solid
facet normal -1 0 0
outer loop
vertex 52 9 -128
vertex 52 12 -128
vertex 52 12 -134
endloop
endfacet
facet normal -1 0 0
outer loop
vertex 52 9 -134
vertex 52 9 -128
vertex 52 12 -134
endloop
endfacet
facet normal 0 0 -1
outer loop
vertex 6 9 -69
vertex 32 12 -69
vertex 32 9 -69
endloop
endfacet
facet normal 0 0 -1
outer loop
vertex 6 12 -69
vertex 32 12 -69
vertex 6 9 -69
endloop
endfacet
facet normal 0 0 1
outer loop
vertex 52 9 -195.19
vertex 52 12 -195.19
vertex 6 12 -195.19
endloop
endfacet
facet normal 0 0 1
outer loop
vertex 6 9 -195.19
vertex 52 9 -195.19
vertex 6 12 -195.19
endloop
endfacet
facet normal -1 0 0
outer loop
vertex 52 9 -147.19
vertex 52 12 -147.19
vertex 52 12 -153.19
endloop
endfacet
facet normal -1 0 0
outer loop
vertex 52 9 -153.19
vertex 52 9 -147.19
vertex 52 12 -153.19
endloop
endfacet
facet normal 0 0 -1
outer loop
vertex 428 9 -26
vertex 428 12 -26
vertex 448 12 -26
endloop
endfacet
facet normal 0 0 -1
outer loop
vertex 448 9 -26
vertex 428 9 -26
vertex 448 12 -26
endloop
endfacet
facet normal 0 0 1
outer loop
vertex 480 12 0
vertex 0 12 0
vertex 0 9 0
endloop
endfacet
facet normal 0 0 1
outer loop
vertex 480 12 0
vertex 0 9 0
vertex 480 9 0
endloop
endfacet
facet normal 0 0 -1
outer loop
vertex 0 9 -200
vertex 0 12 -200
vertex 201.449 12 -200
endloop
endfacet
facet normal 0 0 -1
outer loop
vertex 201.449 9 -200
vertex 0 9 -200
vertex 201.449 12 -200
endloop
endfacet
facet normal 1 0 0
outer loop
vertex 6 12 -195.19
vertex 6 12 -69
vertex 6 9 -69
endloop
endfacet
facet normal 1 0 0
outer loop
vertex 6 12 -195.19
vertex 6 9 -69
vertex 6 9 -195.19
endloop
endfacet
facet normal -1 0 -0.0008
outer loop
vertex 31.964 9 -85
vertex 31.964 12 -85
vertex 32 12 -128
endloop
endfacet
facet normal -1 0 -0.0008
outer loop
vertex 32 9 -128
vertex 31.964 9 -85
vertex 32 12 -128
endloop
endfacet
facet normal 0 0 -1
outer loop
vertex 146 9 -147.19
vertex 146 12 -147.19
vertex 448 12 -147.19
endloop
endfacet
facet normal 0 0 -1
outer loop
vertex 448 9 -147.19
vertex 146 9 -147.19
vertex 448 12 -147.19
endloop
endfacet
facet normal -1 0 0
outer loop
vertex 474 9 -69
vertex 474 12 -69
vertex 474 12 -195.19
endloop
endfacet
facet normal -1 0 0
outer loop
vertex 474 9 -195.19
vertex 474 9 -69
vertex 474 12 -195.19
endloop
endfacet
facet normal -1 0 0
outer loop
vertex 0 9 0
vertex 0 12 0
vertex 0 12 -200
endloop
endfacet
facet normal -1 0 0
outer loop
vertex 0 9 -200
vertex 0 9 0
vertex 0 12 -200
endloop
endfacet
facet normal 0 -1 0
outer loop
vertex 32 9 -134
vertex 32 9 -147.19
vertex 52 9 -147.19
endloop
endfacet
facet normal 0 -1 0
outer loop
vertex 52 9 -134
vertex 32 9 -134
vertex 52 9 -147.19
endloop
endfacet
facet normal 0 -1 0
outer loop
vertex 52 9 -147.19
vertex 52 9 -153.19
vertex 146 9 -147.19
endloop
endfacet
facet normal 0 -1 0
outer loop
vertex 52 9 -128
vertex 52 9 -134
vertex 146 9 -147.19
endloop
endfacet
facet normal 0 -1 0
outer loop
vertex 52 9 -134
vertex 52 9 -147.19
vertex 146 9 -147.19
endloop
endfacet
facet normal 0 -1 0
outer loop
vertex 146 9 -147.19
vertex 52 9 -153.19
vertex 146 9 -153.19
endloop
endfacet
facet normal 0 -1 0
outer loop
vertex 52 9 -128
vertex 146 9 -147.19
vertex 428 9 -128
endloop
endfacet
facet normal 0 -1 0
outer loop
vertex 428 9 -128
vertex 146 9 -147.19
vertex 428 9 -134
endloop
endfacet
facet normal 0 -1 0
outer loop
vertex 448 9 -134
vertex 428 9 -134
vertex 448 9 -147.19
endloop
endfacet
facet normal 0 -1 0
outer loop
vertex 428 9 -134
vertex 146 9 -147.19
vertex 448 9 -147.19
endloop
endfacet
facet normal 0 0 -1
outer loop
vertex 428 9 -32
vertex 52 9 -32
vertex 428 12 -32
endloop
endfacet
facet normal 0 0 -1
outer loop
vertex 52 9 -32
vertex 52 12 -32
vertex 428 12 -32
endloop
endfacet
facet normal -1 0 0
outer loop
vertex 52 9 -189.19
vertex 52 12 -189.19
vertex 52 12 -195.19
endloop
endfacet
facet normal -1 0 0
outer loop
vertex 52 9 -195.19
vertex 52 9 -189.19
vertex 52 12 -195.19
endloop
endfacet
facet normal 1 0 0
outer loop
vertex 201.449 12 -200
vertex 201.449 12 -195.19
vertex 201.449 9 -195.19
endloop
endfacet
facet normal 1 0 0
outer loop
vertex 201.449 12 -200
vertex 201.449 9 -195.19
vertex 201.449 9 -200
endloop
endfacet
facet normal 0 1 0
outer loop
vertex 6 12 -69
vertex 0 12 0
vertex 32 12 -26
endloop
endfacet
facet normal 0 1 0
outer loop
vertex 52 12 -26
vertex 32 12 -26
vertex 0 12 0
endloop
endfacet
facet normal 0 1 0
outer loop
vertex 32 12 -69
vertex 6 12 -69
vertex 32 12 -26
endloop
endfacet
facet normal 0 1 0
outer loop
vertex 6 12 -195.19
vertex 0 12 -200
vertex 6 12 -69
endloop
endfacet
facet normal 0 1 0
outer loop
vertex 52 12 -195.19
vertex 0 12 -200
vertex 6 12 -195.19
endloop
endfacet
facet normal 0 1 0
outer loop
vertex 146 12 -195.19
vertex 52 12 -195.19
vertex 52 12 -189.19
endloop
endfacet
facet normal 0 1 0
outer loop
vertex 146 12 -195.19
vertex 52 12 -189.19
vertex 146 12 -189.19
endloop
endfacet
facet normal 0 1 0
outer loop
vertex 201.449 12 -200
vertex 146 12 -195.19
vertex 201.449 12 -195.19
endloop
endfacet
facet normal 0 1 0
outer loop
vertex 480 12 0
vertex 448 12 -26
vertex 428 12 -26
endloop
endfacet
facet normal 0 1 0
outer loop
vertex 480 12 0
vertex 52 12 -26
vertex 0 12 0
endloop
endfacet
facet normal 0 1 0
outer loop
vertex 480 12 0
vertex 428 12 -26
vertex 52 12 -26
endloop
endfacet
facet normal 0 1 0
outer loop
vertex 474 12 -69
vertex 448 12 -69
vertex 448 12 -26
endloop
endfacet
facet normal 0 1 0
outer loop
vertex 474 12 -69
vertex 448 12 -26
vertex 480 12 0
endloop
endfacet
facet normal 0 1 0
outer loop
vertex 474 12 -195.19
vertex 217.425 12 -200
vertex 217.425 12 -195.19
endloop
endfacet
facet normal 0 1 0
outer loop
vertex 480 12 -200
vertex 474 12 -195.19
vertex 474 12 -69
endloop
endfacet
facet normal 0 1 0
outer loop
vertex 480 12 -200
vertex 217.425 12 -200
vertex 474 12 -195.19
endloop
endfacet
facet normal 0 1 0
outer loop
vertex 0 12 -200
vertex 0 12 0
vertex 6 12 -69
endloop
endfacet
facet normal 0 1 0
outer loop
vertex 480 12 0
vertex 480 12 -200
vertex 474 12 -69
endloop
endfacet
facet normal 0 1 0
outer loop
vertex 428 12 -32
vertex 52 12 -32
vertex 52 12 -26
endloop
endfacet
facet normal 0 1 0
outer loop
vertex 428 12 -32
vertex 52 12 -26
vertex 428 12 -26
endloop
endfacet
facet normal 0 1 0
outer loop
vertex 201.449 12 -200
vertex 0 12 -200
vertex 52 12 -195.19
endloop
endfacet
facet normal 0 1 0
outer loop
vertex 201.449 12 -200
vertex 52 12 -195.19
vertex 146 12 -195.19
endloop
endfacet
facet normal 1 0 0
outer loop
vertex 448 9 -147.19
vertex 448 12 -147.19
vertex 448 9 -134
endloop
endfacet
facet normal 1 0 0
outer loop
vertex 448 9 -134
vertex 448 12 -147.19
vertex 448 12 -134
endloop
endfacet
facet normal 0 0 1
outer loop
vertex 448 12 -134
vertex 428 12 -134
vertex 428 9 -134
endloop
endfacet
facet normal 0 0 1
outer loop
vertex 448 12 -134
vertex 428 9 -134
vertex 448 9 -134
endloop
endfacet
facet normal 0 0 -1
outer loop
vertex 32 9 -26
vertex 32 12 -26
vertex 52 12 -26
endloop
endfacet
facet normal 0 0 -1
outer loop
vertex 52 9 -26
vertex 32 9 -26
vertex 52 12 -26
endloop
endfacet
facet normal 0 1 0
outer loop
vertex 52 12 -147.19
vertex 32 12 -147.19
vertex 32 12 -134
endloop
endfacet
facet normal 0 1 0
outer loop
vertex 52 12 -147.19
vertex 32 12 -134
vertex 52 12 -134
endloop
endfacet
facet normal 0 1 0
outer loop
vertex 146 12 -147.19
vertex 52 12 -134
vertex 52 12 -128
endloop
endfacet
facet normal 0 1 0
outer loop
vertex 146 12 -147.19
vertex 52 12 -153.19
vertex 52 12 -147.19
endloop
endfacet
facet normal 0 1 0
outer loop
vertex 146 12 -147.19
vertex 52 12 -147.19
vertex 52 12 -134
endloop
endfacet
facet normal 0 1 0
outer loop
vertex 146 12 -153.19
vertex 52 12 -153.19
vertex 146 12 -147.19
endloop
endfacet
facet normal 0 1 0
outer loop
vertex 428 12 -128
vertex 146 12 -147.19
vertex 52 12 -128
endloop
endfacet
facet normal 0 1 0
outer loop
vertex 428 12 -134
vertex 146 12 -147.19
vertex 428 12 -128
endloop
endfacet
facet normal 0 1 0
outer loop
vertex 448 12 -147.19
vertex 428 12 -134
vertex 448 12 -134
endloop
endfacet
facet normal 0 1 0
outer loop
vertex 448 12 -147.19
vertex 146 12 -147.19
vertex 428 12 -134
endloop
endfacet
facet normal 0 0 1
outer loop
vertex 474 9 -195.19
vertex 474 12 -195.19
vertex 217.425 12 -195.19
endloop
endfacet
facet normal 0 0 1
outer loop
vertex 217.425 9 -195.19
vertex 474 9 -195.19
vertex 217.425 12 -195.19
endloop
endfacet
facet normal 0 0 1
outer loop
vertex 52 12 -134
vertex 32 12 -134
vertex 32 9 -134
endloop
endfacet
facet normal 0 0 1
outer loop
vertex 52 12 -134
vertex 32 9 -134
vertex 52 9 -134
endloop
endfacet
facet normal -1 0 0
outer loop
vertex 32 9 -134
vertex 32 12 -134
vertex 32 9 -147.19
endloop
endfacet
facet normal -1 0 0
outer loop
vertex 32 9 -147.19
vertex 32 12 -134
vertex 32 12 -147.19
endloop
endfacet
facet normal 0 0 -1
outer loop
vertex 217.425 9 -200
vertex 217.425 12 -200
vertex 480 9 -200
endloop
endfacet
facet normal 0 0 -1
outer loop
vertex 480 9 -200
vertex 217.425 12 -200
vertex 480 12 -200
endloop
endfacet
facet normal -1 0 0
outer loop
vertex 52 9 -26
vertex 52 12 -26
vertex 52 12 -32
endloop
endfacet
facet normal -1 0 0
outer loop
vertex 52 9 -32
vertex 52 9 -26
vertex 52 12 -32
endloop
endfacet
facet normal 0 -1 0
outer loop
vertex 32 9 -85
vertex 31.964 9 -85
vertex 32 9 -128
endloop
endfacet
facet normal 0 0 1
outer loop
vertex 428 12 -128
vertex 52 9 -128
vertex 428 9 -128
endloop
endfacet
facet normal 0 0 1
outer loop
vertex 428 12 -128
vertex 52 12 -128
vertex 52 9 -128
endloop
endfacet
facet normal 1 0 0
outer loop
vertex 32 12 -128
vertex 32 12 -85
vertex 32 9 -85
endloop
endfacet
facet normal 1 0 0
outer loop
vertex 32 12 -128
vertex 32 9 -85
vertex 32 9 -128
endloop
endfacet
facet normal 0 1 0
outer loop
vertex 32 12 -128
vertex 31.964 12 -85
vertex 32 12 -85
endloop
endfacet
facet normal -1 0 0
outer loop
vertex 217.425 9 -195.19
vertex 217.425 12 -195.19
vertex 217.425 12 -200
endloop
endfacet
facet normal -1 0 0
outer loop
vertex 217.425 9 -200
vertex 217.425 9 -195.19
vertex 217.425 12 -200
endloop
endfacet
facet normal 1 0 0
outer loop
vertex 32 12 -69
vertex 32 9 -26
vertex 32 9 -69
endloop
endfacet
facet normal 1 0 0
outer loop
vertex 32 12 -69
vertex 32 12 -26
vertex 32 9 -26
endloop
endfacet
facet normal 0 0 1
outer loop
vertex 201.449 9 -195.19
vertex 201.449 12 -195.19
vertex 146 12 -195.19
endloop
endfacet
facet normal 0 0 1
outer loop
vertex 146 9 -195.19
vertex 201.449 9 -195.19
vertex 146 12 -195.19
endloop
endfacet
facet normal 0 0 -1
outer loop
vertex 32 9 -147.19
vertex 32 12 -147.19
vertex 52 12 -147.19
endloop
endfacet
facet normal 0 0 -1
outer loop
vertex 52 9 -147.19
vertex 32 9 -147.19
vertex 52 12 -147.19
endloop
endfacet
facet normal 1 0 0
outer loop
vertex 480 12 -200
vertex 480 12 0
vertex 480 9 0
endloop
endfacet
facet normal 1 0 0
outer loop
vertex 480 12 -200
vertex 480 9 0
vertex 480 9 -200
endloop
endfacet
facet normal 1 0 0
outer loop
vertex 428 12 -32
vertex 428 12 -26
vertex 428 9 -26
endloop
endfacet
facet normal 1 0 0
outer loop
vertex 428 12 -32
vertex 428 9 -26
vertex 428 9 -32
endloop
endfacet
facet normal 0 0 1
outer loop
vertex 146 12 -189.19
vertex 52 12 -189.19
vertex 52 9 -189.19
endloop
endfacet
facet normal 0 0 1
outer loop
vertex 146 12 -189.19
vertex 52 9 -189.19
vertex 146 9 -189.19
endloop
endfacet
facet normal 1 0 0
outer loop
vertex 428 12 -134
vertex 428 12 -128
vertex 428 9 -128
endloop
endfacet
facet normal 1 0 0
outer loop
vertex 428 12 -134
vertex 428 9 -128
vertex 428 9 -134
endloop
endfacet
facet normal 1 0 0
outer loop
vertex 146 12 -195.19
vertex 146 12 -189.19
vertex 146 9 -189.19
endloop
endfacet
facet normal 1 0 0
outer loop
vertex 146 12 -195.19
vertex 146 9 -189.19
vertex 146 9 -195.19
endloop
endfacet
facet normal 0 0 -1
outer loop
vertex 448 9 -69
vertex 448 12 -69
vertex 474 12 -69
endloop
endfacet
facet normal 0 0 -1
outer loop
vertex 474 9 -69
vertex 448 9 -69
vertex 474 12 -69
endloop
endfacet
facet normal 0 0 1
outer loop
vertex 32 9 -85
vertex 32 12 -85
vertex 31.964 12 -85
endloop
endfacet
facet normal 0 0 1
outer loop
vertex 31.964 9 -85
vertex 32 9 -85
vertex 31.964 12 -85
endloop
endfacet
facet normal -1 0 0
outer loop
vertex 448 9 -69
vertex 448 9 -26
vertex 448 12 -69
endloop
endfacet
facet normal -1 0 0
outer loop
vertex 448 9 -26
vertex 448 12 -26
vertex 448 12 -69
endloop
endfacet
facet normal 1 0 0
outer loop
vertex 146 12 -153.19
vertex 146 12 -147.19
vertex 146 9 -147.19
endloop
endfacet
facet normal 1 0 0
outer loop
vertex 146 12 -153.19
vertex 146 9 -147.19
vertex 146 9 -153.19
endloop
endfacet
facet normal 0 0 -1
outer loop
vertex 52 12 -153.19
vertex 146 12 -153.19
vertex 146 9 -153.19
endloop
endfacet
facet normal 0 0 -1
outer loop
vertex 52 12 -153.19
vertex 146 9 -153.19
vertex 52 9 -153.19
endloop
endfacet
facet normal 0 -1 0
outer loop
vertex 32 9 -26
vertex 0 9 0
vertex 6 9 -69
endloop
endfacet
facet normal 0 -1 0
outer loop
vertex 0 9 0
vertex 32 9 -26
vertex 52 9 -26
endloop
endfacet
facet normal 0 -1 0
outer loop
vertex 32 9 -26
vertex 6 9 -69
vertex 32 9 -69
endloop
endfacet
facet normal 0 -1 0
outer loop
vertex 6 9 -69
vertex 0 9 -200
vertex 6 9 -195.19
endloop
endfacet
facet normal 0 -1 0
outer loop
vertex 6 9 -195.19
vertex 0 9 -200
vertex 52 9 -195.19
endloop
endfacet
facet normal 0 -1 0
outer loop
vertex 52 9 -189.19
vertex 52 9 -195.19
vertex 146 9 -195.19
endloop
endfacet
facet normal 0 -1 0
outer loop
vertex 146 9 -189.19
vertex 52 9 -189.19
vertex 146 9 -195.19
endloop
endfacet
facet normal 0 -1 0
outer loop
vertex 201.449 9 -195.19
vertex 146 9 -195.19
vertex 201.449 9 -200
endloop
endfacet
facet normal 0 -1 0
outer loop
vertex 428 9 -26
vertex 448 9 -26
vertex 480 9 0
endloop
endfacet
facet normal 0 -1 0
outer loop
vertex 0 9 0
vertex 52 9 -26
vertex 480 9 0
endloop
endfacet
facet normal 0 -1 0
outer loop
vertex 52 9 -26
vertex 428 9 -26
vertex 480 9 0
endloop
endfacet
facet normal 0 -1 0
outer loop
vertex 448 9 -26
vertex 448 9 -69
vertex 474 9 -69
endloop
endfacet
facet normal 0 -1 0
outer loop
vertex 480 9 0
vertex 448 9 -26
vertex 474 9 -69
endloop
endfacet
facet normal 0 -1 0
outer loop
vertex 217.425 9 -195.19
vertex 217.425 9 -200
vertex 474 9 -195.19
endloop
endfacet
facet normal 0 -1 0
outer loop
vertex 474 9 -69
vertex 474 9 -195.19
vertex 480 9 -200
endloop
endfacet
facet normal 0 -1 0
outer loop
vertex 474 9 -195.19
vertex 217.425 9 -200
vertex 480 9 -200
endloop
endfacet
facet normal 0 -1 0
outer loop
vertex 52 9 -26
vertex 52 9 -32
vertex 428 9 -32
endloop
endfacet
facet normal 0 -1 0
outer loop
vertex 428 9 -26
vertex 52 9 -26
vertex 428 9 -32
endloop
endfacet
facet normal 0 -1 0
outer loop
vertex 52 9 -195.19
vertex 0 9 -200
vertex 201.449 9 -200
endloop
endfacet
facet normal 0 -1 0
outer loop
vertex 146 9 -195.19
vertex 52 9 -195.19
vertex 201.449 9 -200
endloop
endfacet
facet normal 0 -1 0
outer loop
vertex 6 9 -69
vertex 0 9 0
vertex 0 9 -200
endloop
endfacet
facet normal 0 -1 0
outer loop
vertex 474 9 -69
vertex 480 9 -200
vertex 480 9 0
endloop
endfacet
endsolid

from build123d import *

# Parameters (mm, degrees)
CROQUIS1_W              = 486.2
CROQUIS1_H              = 206.2
CROQUIS1_W_2            = 480
CROQUIS1_H_2            = 200
SALIENTE_EXTRUIR1_DEPTH = 12
CROQUIS3_W              = 486.2
CROQUIS3_H              = 206.2
CROQUIS3_W_2            = 480
CROQUIS3_H_2            = 200
CORTAR_EXTRUIR1_DEPTH   = 5
CORTAR_EXTRUIR3_DEPTH   = 8
CROQUIS4_W              = 20
CROQUIS4_H              = 6
CORTAR_EXTRUIR4_DEPTH   = 3
CORTAR_EXTRUIR5_DEPTH   = 2
CROQUIS7_W              = 721.947089947
CROQUIS7_H              = 359.419856831
CORTAR_EXTRUIR6_DEPTH   = 10
CROQUIS8_W              = 416
CROQUIS8_H              = 96
CORTAR_EXTRUIR7_DEPTH   = 10
CROQUIS9_W              = 531.904745737
CROQUIS9_H              = 246.353411826
CORTAR_EXTRUIR8_DEPTH   = 10


with BuildPart() as part:
    # Croquis1 → Saliente-Extruir1 (new body)
    with BuildSketch(Plane(origin=(0, 0, 0), x_dir=(1, 0, 0), z_dir=(0, 1, 0))):
        with Locations((240, 100)):
            Rectangle(CROQUIS1_W, CROQUIS1_H)
        with Locations((240, 100)):
            Rectangle(CROQUIS1_W_2, CROQUIS1_H_2, mode=Mode.SUBTRACT)
        with Locations((240, 100)):
            Rectangle(CROQUIS1_W_2, CROQUIS1_H_2)
    extrude(amount=SALIENTE_EXTRUIR1_DEPTH)

    # Croquis3 → Cortar-Extruir1 (cut)
    with BuildSketch(Plane(origin=(0, 12, 0), x_dir=(1, 0, 0), z_dir=(0, 1, 0))):
        with Locations((240, 100)):
            Rectangle(CROQUIS3_W, CROQUIS3_H)
        with Locations((240, 100)):
            Rectangle(CROQUIS3_W_2, CROQUIS3_H_2, mode=Mode.SUBTRACT)
    extrude(amount=-CORTAR_EXTRUIR1_DEPTH, mode=Mode.SUBTRACT)

    # Croquis2 → Cortar-Extruir3 (cut)
    with BuildSketch(Plane(origin=(0, 12, 0), x_dir=(1, 0, 0), z_dir=(0, 1, 0))):
        with BuildLine():
            ThreePointArc((16, 189.1902066), (13.171572875, 188.018633725), (12, 185.1902066))
            Line((12, 185.1902066), (12, 78))
            ThreePointArc((12, 78), (12.878679656, 75.878679656), (15, 75))
            Line((15, 75), (32, 75))
            Line((32, 75), (32, 32))
            Line((32, 32), (448, 32))
            Line((448, 32), (448, 75))
            Line((448, 75), (464, 75))
            ThreePointArc((464, 75), (466.828427125, 76.171572875), (468, 79))
            Line((468, 79), (468, 185.1902066))
            ThreePointArc((468, 185.1902066), (466.828427125, 188.018633725), (464, 189.1902066))
            Line((464, 189.1902066), (217.424703227, 189.1902066))
            Line((217.424703227, 189.1902066), (217.424703227, 203.1))
            Line((217.424703227, 203.1), (201.44869327, 203.1))
            Line((201.44869327, 203.1), (201.44869327, 189.1902066))
            Line((201.44869327, 189.1902066), (16, 189.1902066))
        make_face()
        with BuildLine():
            Line((32, 85), (31.963588191, 85))
            ThreePointArc((31.963588191, 85), (24.892520379, 87.928932188), (21.963588191, 95))
            Line((21.963588191, 95), (21.963588191, 175.1902066))
            ThreePointArc((21.963588191, 175.1902066), (23.135161066, 178.018633725), (25.963588191, 179.1902066))
            Line((25.963588191, 179.1902066), (28, 179.1902066))
            ThreePointArc((28, 179.1902066), (30.828427125, 178.018633725), (32, 175.1902066))
            Line((32, 175.1902066), (32, 153.1902066))
            Line((32, 153.1902066), (166, 153.1902066))
            Line((166, 153.1902066), (166, 175.1902066))
            ThreePointArc((166, 175.1902066), (167.171572875, 178.018633725), (170, 179.1902066))
            Line((170, 179.1902066), (448.036411809, 179.1902066))
            ThreePointArc((448.036411809, 179.1902066), (455.107479621, 176.261274412), (458.036411809, 169.1902066))
            Line((458.036411809, 169.1902066), (458.036411809, 135.000000034))
            Line((458.036411809, 135.000000034), (458.803569043, 95.19268186))
            ThreePointArc((458.803569043, 95.19268186), (455.944291637, 87.997386866), (448.80542553, 85))
            Line((448.80542553, 85), (448, 85))
            Line((448, 85), (448, 128))
            Line((448, 128), (32, 128))
            Line((32, 128), (32, 85))
        make_face(mode=Mode.SUBTRACT)
    extrude(amount=-CORTAR_EXTRUIR3_DEPTH, mode=Mode.SUBTRACT)

    # Croquis4 → Cortar-Extruir4 (cut)
    with BuildSketch(Plane(origin=(0, 12, 0), x_dir=(1, 0, 0), z_dir=(0, 1, 0))):
        with BuildLine():
            Line((31.963588191, 85), (32, 128))
            Line((32, 128), (32, 134))
            Line((32, 134), (32, 147.1902066))
            Line((32, 147.1902066), (32, 153.1902066))
            Line((32, 153.1902066), (32, 175.1902066))
            ThreePointArc((32, 175.1902066), (30.828427125, 178.018633725), (28, 179.1902066))
            Line((28, 179.1902066), (25.963588191, 179.1902066))
            ThreePointArc((25.963588191, 179.1902066), (23.135161066, 178.018633725), (21.963588191, 175.1902066))
            Line((21.963588191, 175.1902066), (21.963588191, 95))
            ThreePointArc((21.963588191, 95), (24.892520379, 87.928932188), (31.963588191, 85))
        make_face()
        with Locations((42, 131)):
            Rectangle(CROQUIS4_W, CROQUIS4_H)
        with Locations((42, 150.1902066)):
            Rectangle(CROQUIS4_W, CROQUIS4_H)
        with BuildLine():
            ThreePointArc((12, 78), (12.878679656, 75.878679656), (15, 75))
            Line((15, 75), (32, 75))
            Line((32, 75), (32, 69))
            Line((32, 69), (6, 69))
            Line((6, 69), (6, 80))
            Line((6, 80), (6, 195.1902066))
            Line((6, 195.1902066), (16, 195.1902066))
            Line((16, 195.1902066), (32, 195.1902066))
            Line((32, 195.1902066), (32, 189.1902066))
            Line((32, 189.1902066), (16, 189.1902066))
            ThreePointArc((16, 189.1902066), (13.171572875, 188.018633725), (12, 185.1902066))
            Line((12, 185.1902066), (12, 80))
            Line((12, 80), (12, 78))
        make_face()
        with Locations((42, 192.1902066)):
            Rectangle(CROQUIS4_W, CROQUIS4_H)
        with Locations((42, 29)):
            Rectangle(CROQUIS4_W, CROQUIS4_H)
        with Locations((156, 192.1902066)):
            Rectangle(CROQUIS4_W, CROQUIS4_H)
        with Locations((156, 150.1902066)):
            Rectangle(CROQUIS4_W, CROQUIS4_H)
        with BuildLine():
            Line((166, 147.1902066), (448, 147.1902066))
            Line((448, 147.1902066), (458.036411809, 147.1902066))
            Line((458.036411809, 147.1902066), (458.036411809, 169.1902066))
            ThreePointArc((458.036411809, 169.1902066), (455.107479621, 176.261274412), (448.036411809, 179.1902066))
            Line((448.036411809, 179.1902066), (170, 179.1902066))
            ThreePointArc((170, 179.1902066), (167.171572875, 178.018633725), (166, 175.1902066))
            Line((166, 175.1902066), (166, 153.1902066))
            Line((166, 153.1902066), (166, 147.1902066))
        make_face()
        with BuildLine():
            Line((458.036411809, 169.1902066), (458.036411809, 147.1902066))
            Line((458.036411809, 147.1902066), (474, 147.1902066))
            Line((474, 147.1902066), (474, 195.1902066))
            Line((474, 195.1902066), (166, 195.1902066))
            Line((166, 195.1902066), (166, 189.1902066))
            Line((166, 189.1902066), (166, 175.1902066))
            ThreePointArc((166, 175.1902066), (167.171572875, 178.018633725), (170, 179.1902066))
            Line((170, 179.1902066), (448.036411809, 179.1902066))
            ThreePointArc((448.036411809, 179.1902066), (455.107479621, 176.261274412), (458.036411809, 169.1902066))
        make_face()
        with BuildLine():
            Line((448.80542553, 85), (448, 85))
            Line((448, 85), (448, 69))
            Line((448, 69), (474, 69))
            Line((474, 69), (474, 147.1902066))
            Line((474, 147.1902066), (458.036411809, 147.1902066))
            Line((458.036411809, 147.1902066), (458.036411809, 135.000000034))
            Line((458.036411809, 135.000000034), (458.803569043, 95.19268186))
            ThreePointArc((458.803569043, 95.19268186), (455.944291637, 87.997386866), (448.80542553, 85))
        make_face()
        with Locations((438, 131)):
            Rectangle(CROQUIS4_W, CROQUIS4_H)
        with Locations((438, 29)):
            Rectangle(CROQUIS4_W, CROQUIS4_H)
        with BuildLine():
            Line((448, 134), (448, 128))
            Line((448, 128), (448, 85))
            Line((448, 85), (448.80542553, 85))
            ThreePointArc((448.80542553, 85), (455.944291637, 87.997386866), (458.803569043, 95.19268186))
            Line((458.803569043, 95.19268186), (458.036411809, 135.000000034))
            Line((458.036411809, 135.000000034), (458.036411809, 147.1902066))
            Line((458.036411809, 147.1902066), (448, 147.1902066))
            Line((448, 147.1902066), (448, 134))
        make_face()
    extrude(amount=-CORTAR_EXTRUIR4_DEPTH, mode=Mode.SUBTRACT)

    # Croquis5 → Cortar-Extruir5 (cut)
    with BuildSketch(Plane(origin=(0, 4, 0), x_dir=(1, 0, 0), z_dir=(0, 1, 0))):
        with BuildLine():
            Line((32.046028397, 84.926485337), (32, 75))
            Line((32, 75), (15, 75))
            ThreePointArc((15, 75), (12.878679656, 75.878679656), (12, 78))
            Line((12, 78), (12, 185.1902066))
            ThreePointArc((12, 185.1902066), (13.171572875, 188.018633725), (16, 189.1902066))
            Line((16, 189.1902066), (201.44869327, 189.1902066))
            Line((201.44869327, 189.1902066), (201.44869327, 203.1))
            Line((201.44869327, 203.1), (217.424703227, 203.1))
            Line((217.424703227, 203.1), (217.424703227, 189.1902066))
            Line((217.424703227, 189.1902066), (464, 189.1902066))
            ThreePointArc((464, 189.1902066), (466.828427125, 188.018633725), (468, 185.1902066))
            Line((468, 185.1902066), (468, 79))
            ThreePointArc((468, 79), (466.828427125, 76.171572875), (464, 75))
            Line((464, 75), (448, 75))
            Line((448, 75), (448, 85))
            Line((448, 85), (448.80542553, 85))
            ThreePointArc((448.80542553, 85), (455.917657262, 88.023512896), (458.803569043, 95.19268186))
            Line((458.803569043, 95.19268186), (458.036411809, 169.1902066))
            ThreePointArc((458.036411809, 169.1902066), (455.107479621, 176.261274412), (448.036411809, 179.1902066))
            Line((448.036411809, 179.1902066), (170, 179.1902066))
            ThreePointArc((170, 179.1902066), (167.171572875, 178.018633725), (166, 175.1902066))
            Line((166, 175.1902066), (166, 153.1902066))
            Line((166, 153.1902066), (32, 153.1902066))
            Line((32, 153.1902066), (32, 175.1902066))
            ThreePointArc((32, 175.1902066), (30.828427125, 178.018633725), (28, 179.1902066))
            Line((28, 179.1902066), (25.963588191, 179.1902066))
            ThreePointArc((25.963588191, 179.1902066), (23.135161066, 178.018633725), (21.963588191, 175.1902066))
            Line((21.963588191, 175.1902066), (21.963588191, 95))
            ThreePointArc((21.963588191, 95), (24.91720844, 87.873793117), (32.046028397, 84.926485337))
        make_face()
    extrude(amount=-CORTAR_EXTRUIR5_DEPTH, mode=Mode.SUBTRACT)

    # Croquis7 → Cortar-Extruir6 (cut)
    with BuildSketch(Plane(origin=(0, 2, 0), x_dir=(1, 0, 0), z_dir=(0, 1, 0))):
        with Locations((149.368191722, 161.470369199)):
            Rectangle(CROQUIS7_W, CROQUIS7_H)
    extrude(amount=-CORTAR_EXTRUIR6_DEPTH, mode=Mode.SUBTRACT)

    # Croquis8 → Cortar-Extruir7 (cut)
    with BuildSketch(Plane(origin=(0, 4, 0), x_dir=(1, 0, 0), z_dir=(0, 1, 0))):
        with Locations((240, 80)):
            Rectangle(CROQUIS8_W, CROQUIS8_H)
    extrude(amount=-CORTAR_EXTRUIR7_DEPTH, mode=Mode.SUBTRACT)


with BuildPart() as cortar_extruir7_piece_1:
    # of the separate pieces the step leaves, piece 1, a body of its own (cortar_extruir7_pieces)
    add(part.part.solids().sort_by_distance((483.1, 2, 3.1))[0])


with BuildPart() as cortar_extruir7_piece_2:
    # of the separate pieces the step leaves, piece 2, a body of its own (cortar_extruir7_pieces)
    add(part.part.solids().sort_by_distance((32, 2, -128))[0])


with BuildPart() as cortar_extruir8_tool:
    # Croquis9 → Cortar-Extruir8 (new body)
    with BuildSketch(Plane(origin=(0, 9, 0), x_dir=(1, 0, 0), z_dir=(0, 1, 0))):
        with Locations((247.004349215, 106.418772052)):
            Rectangle(CROQUIS9_W, CROQUIS9_H)
    extrude(amount=-CORTAR_EXTRUIR8_DEPTH)


with BuildPart() as cortar_extruir7_piece_1_1:
    add(cortar_extruir7_piece_1.part)

    # Cortar-Extruir8: cut by cortar_extruir8_tool
    add(cortar_extruir8_tool.part, mode=Mode.SUBTRACT)


with BuildPart() as cortar_extruir7_piece_2_1:
    add(cortar_extruir7_piece_2.part)

    # Cortar-Extruir8: cut by cortar_extruir8_tool
    add(cortar_extruir8_tool.part, mode=Mode.SUBTRACT)


solid = Compound([cortar_extruir7_piece_1_1.part, cortar_extruir7_piece_2_1.part])
